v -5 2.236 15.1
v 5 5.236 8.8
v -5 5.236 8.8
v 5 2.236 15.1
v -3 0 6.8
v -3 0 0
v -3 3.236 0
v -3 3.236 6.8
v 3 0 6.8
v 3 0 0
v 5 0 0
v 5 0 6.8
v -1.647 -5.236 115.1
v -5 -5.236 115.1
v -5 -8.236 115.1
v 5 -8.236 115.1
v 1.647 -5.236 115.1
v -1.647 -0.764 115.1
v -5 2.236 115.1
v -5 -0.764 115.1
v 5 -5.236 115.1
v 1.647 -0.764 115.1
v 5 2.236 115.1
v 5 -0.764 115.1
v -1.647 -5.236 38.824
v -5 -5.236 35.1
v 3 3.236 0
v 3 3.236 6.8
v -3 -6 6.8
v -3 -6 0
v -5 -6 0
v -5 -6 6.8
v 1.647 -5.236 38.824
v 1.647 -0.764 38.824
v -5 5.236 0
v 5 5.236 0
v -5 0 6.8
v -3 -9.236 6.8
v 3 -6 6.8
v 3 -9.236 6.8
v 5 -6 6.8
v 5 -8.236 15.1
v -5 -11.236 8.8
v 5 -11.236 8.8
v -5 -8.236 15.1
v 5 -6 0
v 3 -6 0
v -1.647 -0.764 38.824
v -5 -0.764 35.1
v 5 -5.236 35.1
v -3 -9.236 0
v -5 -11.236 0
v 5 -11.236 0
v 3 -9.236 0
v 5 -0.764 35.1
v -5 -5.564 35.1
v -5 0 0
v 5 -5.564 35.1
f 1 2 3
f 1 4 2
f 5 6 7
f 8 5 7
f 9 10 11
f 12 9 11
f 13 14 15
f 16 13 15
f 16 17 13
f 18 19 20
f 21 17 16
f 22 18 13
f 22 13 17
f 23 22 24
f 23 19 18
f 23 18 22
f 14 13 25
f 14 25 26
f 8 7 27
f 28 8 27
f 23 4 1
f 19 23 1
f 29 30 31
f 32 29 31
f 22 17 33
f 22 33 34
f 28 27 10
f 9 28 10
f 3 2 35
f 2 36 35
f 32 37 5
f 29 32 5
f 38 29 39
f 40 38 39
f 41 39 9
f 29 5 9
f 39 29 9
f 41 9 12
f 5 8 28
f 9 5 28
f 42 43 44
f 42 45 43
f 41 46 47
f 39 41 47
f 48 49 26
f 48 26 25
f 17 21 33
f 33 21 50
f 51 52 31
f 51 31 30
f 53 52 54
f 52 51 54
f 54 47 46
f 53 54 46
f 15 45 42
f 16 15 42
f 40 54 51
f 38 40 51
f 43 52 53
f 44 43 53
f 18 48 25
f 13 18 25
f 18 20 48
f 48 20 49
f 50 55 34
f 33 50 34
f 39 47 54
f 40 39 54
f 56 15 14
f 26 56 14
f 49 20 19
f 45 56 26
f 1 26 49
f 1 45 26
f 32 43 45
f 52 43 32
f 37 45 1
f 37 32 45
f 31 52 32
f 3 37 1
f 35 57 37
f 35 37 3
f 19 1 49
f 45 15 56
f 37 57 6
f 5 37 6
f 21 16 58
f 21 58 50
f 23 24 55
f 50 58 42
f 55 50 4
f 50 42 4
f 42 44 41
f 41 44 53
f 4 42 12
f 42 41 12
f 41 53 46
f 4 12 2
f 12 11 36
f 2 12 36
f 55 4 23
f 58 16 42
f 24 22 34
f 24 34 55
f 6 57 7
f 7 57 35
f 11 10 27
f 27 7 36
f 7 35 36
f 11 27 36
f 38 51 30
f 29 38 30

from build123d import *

# Parameters (mm, degrees)
F1_DEPTH  = 6.8
F3_DEPTH  = 2
F3_FACE_W = 10
F3_FACE_H = 16.472
F6_W      = 10
F6_H      = 10.472
F9_DEPTH  = 100
F10_W     = 3.3527343459
F10_H     = 4.472
F11_DEPTH = 20
F13_DEPTH = 4.8


with BuildPart() as f1:
    # F0 (on Top) → F1 (new body)
    with BuildSketch(Plane.XY):
        Polygon((-5, 5.236), (-5, 0), (-3, 0), (-3, 3.236), (0, 3.236), (3, 3.236), (3, 0), (5, 0), (5, 5.236), (0, 5.236), align=None)
    extrude(amount=F1_DEPTH)


with BuildPart() as f1b:
    # F0 (on Top) → F1, piece 2 (new body)
    with BuildSketch(Plane.XY):
        Polygon((-3, -6), (-5, -6), (-5, -11.236), (0, -11.236), (5, -11.236), (5, -6), (3, -6), (3, -9.236), (0, -9.236), (-3, -9.236), align=None)
    extrude(amount=F1_DEPTH)


with BuildPart() as f3:
    # F2 (on face) → F3 (new body)
    with BuildSketch(Plane.XY.offset(6.8)):
        Polygon((-3, 0), (-5, 0), (-5, -11.236), (5, -11.236), (5, 0), (3, 0), (3, 3.236), (-3, 3.236), align=None)
        Polygon((5, 5.236), (-5, 5.236), (-5, 0), (-3, 0), (-3, 3.236), (3, 3.236), (3, 0), (5, 0), align=None)
    extrude(amount=F3_DEPTH)


with BuildPart() as f1_1:
    add(f1.part)

    # F4: union F1b, F3
    add(f1b.part)
    add(f3.part)

    # F3_face (on face) → F7 section 0
    with BuildSketch(Plane(origin=(0, -3, 8.8), x_dir=(1, 0, 0), z_dir=(0, 0, 1))):
        Rectangle(F3_FACE_W, F3_FACE_H)
    # F6 (on offset) → F7 section 1
    with BuildSketch(Plane.XY.offset(15.1)):
        with Locations((0, -3)):
            Rectangle(F6_W, F6_H)
    loft()

    # F8 (on face) → F9 (join)
    with BuildSketch(Plane.XY.offset(15.1)):
        Polygon((5, 2.236), (-5, 2.236), (-5, -0.764), (-1.6472656541, -0.764), (-1.6472656541, -5.236), (-5, -5.236), (-5, -8.236), (5, -8.236), (5, -5.236), (1.6472656541, -5.236), (1.6472656541, -0.764), (5, -0.764), align=None)
    extrude(amount=F9_DEPTH)

    # F10 (on face) → F11 (join)
    with BuildSketch(Plane.XY.offset(15.1)):
        with Locations((3.323632827, -3)):
            Rectangle(F10_W, F10_H)
    extrude(amount=F11_DEPTH)

    # F12 (on face) → F13 (join)
    with BuildSketch(Plane.XZ.offset(0.764)):
        Polygon((1.6472656541, 35.1), (5, 35.1), (1.6472656541, 38.8235887235), align=None)
    extrude(amount=F13_DEPTH)

    # F14: F1 across plane


with BuildPart() as f1_2:
    add(f1_1.part)
    add(f1_1.part.mirror(Plane.YZ))


solid = f1_2.part
